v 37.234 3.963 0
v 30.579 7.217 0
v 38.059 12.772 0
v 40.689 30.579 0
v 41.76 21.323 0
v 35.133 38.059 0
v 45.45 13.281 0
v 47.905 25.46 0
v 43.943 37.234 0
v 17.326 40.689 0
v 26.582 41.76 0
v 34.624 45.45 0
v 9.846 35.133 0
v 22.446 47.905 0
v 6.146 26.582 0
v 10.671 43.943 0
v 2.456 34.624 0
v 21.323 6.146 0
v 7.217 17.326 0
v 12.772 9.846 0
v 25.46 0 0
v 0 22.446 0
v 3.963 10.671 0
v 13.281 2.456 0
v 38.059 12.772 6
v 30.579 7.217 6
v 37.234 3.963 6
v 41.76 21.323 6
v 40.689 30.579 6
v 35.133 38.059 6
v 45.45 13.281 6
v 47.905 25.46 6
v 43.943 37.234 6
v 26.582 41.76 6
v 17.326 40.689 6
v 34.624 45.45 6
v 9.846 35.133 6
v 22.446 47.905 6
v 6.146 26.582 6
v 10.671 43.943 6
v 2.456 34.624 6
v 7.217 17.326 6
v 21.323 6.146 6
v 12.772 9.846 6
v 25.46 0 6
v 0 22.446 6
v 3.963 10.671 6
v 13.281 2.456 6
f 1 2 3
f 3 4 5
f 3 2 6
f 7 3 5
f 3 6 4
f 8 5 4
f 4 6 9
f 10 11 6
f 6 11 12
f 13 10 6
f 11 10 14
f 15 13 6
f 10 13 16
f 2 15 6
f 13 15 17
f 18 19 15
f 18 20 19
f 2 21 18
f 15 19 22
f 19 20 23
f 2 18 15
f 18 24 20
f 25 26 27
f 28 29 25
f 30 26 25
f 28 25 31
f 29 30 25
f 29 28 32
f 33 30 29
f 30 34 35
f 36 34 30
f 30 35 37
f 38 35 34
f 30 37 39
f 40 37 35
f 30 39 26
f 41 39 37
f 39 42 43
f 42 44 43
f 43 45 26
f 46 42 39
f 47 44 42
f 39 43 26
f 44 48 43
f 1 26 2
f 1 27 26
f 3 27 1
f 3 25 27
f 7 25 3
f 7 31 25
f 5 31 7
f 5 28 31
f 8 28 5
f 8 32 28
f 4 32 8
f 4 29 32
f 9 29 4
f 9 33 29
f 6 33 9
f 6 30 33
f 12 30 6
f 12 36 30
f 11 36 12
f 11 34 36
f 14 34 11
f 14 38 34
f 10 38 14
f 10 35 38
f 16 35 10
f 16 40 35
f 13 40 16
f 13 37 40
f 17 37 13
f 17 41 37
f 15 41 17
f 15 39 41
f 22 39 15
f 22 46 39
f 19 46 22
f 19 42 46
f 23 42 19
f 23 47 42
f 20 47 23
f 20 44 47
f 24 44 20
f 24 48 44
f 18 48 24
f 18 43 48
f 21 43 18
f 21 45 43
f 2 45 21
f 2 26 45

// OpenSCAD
$fn = 32;

// ----------------------------------------------------------------------
// Chain sprocket: 12 teeth, 18 mm root radius
// ----------------------------------------------------------------------

// --- parameters (mm) ---
profile_height = 6;       // extrusion height
profile_points = 24;      // points of the closed outline

profile = [[41.76, 21.323], [47.905, 25.46], [40.689, 30.579], [43.943, 37.234], [35.133, 38.059], [34.624, 45.45], [26.582, 41.76], [22.446, 47.905], [17.326, 40.689], [10.671, 43.943], [9.846, 35.133], [2.456, 34.624], [6.146, 26.582], [0, 22.446], [7.217, 17.326], [3.963, 10.671], [12.772, 9.846], [13.281, 2.456], [21.323, 6.146], [25.46, 0], [30.579, 7.217], [37.234, 3.963], [38.059, 12.772], [45.45, 13.281]];  // single closed polygon, 24 points, counter clockwise

// --- the one profile operation ---
linear_extrude(height = profile_height) polygon(points = profile);
